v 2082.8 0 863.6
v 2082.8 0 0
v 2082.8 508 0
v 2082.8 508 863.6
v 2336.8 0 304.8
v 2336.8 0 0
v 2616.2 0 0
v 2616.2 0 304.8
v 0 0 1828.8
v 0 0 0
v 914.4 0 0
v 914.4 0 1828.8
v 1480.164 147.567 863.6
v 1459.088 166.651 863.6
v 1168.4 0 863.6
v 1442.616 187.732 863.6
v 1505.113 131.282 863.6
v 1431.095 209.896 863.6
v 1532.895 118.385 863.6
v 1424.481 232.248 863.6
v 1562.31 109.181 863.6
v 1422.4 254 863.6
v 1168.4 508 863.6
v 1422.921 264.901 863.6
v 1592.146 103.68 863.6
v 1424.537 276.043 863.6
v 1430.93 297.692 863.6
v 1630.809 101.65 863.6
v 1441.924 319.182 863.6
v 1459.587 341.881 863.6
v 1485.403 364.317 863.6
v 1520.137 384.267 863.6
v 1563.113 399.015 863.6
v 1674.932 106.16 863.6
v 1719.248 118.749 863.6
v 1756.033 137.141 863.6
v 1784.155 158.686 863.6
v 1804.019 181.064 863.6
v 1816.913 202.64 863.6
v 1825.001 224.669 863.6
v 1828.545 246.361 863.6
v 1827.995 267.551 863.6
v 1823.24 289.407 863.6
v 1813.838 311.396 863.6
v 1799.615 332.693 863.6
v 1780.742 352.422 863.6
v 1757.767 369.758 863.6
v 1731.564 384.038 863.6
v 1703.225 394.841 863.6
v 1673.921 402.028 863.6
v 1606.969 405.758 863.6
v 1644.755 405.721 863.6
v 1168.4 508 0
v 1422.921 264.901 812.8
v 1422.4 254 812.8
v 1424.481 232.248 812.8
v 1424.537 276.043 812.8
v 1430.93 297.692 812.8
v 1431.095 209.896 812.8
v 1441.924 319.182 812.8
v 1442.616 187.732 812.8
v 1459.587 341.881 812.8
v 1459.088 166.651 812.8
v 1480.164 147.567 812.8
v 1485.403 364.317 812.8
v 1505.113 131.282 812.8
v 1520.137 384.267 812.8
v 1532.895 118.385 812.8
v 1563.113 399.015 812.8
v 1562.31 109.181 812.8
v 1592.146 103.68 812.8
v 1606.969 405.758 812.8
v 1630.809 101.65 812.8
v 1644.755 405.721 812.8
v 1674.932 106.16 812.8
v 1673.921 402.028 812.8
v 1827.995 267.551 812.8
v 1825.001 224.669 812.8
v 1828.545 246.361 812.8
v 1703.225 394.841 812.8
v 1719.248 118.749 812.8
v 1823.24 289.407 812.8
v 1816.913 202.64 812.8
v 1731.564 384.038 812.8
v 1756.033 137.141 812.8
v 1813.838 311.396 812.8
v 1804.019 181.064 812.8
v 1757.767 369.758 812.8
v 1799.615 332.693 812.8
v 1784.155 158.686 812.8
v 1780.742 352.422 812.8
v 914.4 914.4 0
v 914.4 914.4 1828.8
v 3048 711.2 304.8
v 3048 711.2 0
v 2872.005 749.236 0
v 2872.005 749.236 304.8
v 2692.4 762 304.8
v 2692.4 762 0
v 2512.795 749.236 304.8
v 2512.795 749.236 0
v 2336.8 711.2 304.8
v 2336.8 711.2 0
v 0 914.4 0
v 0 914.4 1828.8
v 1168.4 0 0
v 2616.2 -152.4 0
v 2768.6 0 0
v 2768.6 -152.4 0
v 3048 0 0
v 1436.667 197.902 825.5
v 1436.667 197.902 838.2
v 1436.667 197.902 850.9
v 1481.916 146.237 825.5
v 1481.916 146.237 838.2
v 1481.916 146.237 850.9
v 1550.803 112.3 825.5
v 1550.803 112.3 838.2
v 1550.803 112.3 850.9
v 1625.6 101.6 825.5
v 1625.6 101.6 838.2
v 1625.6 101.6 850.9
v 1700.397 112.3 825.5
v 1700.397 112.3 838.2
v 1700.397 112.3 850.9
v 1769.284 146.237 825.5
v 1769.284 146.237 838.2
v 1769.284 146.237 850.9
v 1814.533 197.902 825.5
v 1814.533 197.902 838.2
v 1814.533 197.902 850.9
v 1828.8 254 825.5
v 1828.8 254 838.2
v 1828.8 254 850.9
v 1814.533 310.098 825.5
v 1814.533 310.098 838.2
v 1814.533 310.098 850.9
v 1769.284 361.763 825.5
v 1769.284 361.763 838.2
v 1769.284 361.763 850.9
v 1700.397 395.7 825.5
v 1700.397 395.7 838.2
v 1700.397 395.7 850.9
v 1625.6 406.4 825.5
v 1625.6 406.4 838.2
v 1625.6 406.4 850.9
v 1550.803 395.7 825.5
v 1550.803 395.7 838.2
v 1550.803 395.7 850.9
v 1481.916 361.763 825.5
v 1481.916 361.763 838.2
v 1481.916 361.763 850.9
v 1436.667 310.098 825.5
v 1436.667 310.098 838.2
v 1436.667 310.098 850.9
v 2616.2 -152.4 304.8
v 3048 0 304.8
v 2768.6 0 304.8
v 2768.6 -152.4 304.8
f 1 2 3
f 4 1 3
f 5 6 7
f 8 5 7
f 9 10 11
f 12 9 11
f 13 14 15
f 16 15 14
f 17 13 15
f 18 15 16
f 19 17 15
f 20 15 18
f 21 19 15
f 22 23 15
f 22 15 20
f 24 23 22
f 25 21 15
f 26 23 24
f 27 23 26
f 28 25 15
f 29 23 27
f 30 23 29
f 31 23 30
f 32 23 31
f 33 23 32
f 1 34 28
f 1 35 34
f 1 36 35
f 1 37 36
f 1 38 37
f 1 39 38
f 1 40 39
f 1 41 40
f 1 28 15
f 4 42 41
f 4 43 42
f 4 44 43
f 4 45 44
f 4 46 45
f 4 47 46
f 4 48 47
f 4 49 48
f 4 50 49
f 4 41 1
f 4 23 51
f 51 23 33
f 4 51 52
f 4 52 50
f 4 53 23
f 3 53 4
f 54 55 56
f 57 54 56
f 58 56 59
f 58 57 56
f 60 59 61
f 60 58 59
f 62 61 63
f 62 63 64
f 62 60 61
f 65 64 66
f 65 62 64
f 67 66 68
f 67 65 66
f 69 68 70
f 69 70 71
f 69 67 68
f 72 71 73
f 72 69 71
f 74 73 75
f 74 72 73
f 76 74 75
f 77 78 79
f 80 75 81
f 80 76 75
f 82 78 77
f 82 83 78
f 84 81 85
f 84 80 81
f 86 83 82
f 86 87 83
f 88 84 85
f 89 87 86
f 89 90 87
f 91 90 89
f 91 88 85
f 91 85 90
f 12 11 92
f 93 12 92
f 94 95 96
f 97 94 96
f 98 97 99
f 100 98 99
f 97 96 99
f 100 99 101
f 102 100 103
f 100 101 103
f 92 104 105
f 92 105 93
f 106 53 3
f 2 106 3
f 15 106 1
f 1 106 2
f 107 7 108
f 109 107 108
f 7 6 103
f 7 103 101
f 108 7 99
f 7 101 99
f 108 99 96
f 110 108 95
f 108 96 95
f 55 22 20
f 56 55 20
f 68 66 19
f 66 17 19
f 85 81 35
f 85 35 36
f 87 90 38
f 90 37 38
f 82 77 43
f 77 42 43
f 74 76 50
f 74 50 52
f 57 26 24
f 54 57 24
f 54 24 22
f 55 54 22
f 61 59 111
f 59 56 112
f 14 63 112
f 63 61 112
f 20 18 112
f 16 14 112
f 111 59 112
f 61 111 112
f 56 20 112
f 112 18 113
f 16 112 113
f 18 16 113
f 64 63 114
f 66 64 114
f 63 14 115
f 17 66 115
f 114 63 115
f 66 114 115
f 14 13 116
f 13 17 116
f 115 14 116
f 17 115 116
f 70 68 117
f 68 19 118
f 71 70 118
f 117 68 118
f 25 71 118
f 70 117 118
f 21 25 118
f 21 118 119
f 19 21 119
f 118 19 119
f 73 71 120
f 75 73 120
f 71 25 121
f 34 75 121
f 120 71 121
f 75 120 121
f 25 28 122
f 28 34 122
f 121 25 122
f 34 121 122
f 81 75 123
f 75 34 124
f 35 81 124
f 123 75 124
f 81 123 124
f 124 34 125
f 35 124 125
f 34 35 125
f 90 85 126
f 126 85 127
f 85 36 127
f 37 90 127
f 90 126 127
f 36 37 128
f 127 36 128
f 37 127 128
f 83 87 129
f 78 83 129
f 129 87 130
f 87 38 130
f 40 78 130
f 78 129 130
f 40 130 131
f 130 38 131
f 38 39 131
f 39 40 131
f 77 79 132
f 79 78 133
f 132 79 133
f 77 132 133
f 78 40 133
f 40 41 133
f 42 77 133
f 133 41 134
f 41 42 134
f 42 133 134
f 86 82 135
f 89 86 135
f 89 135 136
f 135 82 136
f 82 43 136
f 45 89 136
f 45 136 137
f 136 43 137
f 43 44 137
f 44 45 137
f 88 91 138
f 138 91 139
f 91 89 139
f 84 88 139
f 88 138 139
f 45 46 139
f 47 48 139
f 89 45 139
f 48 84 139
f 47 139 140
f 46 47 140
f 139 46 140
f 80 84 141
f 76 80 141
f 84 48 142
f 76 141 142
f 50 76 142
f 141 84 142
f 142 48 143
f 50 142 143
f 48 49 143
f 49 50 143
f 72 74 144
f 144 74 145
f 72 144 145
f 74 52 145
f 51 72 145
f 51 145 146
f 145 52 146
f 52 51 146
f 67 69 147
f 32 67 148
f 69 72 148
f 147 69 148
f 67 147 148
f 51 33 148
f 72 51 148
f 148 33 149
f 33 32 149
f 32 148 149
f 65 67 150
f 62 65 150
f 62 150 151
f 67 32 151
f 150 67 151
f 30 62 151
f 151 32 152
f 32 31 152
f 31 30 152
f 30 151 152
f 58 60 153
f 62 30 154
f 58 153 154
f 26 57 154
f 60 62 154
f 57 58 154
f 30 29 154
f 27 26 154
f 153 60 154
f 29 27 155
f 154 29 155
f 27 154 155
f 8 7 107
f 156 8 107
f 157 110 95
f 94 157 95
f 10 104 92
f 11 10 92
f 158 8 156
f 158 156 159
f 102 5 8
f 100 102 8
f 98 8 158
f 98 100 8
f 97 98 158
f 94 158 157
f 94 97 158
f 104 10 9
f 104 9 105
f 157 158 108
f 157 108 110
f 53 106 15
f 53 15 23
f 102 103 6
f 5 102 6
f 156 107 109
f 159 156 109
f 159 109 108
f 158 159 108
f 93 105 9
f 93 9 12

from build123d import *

# Parameters (mm, degrees)
F0_W     = 914.4
F0_H     = 914.4
F1_DEPTH = 1828.8
F2_W     = 914.4
F2_H     = 508
F3_DEPTH = 863.6
F5_DEPTH = 50.8
F7_DEPTH = 304.8


# Not quite as in the source:
# - a feature of the source that left no trace in its solid (it failed there, or was rolled back) is left out


with BuildPart() as f1:
    # F0 (on Top) → F1 (new body)
    with BuildSketch(Plane.XY):
        with Locations((457.2, 457.2)):
            Rectangle(F0_W, F0_H)
    extrude(amount=F1_DEPTH)


with BuildPart() as f3:
    # F2 (on Top) → F3 (new body)
    with BuildSketch(Plane.XY):
        with Locations((1625.6, 254)):
            Rectangle(F2_W, F2_H)
    extrude(amount=F3_DEPTH)

    # F4 (on face) → F5 (cut)
    with BuildSketch(Plane.XY.offset(863.6)):
        with BuildLine():
            add(Edge.make_bspline(
                [(1828.8, 254), (1828.8, 406.4), (1625.6, 406.4)],
                knots=[0, 0, 0, 1.5707963268, 1.5707963268, 1.5707963268], degree=2, weights=[1, 0.7071067812, 1]))
            Line((1625.6, 406.4), (1625.6, 254))
            Line((1625.6, 254), (1828.8, 254))
        make_face()
        with BuildLine():
            Line((1625.6, 254), (1625.6, 406.4))
            add(Edge.make_bspline(
                [(1625.6, 406.4), (1422.4, 406.4), (1422.4, 254)],
                knots=[1.5707963268, 1.5707963268, 1.5707963268, 3.1415926536, 3.1415926536, 3.1415926536], degree=2, weights=[1, 0.7071067812, 1]))
            Line((1422.4, 254), (1625.6, 254))
        make_face()
        with BuildLine():
            Line((1828.8, 254), (1625.6, 254))
            Line((1625.6, 254), (1625.6, 101.6))
            add(Edge.make_bspline(
                [(1625.6, 101.6), (1828.8, 101.6), (1828.8, 254)],
                knots=[4.7123889804, 4.7123889804, 4.7123889804, 6.2831853072, 6.2831853072, 6.2831853072], degree=2, weights=[1, 0.7071067812, 1]))
        make_face()
        with BuildLine():
            Line((1625.6, 101.6), (1625.6, 254))
            Line((1625.6, 254), (1422.4, 254))
            add(Edge.make_bspline(
                [(1422.4, 254), (1422.4, 101.6), (1625.6, 101.6)],
                knots=[3.1415926536, 3.1415926536, 3.1415926536, 4.7123889804, 4.7123889804, 4.7123889804], degree=2, weights=[1, 0.7071067812, 1]))
        make_face()
    extrude(amount=-F5_DEPTH, mode=Mode.SUBTRACT)


with BuildPart() as f7:
    # F6 (on Top) → F7 (new body)
    with BuildSketch(Plane.XY):
        with BuildLine():
            Line((2336.8, 711.2), (2336.8, 0))
            Line((2336.8, 0), (2616.2, 0))
            Line((2616.2, 0), (2616.2, -152.4))
            Line((2616.2, -152.4), (2692.4, -152.4))
            Line((2692.4, -152.4), (2692.4, 762))
            ThreePointArc((2692.4, 762), (2512.7948775786, 749.2358569497), (2336.8, 711.2))
        make_face()
        with BuildLine():
            ThreePointArc((3048, 711.2), (2872.0051224214, 749.2358569497), (2692.4, 762))
            Line((2692.4, 762), (2692.4, -152.4))
            Line((2692.4, -152.4), (2768.6, -152.4))
            Line((2768.6, -152.4), (2768.6, 0))
            Line((2768.6, 0), (3048, 0))
            Line((3048, 0), (3048, 711.2))
        make_face()
    extrude(amount=F7_DEPTH)


solid = Compound([f1.part, f3.part, f7.part])
